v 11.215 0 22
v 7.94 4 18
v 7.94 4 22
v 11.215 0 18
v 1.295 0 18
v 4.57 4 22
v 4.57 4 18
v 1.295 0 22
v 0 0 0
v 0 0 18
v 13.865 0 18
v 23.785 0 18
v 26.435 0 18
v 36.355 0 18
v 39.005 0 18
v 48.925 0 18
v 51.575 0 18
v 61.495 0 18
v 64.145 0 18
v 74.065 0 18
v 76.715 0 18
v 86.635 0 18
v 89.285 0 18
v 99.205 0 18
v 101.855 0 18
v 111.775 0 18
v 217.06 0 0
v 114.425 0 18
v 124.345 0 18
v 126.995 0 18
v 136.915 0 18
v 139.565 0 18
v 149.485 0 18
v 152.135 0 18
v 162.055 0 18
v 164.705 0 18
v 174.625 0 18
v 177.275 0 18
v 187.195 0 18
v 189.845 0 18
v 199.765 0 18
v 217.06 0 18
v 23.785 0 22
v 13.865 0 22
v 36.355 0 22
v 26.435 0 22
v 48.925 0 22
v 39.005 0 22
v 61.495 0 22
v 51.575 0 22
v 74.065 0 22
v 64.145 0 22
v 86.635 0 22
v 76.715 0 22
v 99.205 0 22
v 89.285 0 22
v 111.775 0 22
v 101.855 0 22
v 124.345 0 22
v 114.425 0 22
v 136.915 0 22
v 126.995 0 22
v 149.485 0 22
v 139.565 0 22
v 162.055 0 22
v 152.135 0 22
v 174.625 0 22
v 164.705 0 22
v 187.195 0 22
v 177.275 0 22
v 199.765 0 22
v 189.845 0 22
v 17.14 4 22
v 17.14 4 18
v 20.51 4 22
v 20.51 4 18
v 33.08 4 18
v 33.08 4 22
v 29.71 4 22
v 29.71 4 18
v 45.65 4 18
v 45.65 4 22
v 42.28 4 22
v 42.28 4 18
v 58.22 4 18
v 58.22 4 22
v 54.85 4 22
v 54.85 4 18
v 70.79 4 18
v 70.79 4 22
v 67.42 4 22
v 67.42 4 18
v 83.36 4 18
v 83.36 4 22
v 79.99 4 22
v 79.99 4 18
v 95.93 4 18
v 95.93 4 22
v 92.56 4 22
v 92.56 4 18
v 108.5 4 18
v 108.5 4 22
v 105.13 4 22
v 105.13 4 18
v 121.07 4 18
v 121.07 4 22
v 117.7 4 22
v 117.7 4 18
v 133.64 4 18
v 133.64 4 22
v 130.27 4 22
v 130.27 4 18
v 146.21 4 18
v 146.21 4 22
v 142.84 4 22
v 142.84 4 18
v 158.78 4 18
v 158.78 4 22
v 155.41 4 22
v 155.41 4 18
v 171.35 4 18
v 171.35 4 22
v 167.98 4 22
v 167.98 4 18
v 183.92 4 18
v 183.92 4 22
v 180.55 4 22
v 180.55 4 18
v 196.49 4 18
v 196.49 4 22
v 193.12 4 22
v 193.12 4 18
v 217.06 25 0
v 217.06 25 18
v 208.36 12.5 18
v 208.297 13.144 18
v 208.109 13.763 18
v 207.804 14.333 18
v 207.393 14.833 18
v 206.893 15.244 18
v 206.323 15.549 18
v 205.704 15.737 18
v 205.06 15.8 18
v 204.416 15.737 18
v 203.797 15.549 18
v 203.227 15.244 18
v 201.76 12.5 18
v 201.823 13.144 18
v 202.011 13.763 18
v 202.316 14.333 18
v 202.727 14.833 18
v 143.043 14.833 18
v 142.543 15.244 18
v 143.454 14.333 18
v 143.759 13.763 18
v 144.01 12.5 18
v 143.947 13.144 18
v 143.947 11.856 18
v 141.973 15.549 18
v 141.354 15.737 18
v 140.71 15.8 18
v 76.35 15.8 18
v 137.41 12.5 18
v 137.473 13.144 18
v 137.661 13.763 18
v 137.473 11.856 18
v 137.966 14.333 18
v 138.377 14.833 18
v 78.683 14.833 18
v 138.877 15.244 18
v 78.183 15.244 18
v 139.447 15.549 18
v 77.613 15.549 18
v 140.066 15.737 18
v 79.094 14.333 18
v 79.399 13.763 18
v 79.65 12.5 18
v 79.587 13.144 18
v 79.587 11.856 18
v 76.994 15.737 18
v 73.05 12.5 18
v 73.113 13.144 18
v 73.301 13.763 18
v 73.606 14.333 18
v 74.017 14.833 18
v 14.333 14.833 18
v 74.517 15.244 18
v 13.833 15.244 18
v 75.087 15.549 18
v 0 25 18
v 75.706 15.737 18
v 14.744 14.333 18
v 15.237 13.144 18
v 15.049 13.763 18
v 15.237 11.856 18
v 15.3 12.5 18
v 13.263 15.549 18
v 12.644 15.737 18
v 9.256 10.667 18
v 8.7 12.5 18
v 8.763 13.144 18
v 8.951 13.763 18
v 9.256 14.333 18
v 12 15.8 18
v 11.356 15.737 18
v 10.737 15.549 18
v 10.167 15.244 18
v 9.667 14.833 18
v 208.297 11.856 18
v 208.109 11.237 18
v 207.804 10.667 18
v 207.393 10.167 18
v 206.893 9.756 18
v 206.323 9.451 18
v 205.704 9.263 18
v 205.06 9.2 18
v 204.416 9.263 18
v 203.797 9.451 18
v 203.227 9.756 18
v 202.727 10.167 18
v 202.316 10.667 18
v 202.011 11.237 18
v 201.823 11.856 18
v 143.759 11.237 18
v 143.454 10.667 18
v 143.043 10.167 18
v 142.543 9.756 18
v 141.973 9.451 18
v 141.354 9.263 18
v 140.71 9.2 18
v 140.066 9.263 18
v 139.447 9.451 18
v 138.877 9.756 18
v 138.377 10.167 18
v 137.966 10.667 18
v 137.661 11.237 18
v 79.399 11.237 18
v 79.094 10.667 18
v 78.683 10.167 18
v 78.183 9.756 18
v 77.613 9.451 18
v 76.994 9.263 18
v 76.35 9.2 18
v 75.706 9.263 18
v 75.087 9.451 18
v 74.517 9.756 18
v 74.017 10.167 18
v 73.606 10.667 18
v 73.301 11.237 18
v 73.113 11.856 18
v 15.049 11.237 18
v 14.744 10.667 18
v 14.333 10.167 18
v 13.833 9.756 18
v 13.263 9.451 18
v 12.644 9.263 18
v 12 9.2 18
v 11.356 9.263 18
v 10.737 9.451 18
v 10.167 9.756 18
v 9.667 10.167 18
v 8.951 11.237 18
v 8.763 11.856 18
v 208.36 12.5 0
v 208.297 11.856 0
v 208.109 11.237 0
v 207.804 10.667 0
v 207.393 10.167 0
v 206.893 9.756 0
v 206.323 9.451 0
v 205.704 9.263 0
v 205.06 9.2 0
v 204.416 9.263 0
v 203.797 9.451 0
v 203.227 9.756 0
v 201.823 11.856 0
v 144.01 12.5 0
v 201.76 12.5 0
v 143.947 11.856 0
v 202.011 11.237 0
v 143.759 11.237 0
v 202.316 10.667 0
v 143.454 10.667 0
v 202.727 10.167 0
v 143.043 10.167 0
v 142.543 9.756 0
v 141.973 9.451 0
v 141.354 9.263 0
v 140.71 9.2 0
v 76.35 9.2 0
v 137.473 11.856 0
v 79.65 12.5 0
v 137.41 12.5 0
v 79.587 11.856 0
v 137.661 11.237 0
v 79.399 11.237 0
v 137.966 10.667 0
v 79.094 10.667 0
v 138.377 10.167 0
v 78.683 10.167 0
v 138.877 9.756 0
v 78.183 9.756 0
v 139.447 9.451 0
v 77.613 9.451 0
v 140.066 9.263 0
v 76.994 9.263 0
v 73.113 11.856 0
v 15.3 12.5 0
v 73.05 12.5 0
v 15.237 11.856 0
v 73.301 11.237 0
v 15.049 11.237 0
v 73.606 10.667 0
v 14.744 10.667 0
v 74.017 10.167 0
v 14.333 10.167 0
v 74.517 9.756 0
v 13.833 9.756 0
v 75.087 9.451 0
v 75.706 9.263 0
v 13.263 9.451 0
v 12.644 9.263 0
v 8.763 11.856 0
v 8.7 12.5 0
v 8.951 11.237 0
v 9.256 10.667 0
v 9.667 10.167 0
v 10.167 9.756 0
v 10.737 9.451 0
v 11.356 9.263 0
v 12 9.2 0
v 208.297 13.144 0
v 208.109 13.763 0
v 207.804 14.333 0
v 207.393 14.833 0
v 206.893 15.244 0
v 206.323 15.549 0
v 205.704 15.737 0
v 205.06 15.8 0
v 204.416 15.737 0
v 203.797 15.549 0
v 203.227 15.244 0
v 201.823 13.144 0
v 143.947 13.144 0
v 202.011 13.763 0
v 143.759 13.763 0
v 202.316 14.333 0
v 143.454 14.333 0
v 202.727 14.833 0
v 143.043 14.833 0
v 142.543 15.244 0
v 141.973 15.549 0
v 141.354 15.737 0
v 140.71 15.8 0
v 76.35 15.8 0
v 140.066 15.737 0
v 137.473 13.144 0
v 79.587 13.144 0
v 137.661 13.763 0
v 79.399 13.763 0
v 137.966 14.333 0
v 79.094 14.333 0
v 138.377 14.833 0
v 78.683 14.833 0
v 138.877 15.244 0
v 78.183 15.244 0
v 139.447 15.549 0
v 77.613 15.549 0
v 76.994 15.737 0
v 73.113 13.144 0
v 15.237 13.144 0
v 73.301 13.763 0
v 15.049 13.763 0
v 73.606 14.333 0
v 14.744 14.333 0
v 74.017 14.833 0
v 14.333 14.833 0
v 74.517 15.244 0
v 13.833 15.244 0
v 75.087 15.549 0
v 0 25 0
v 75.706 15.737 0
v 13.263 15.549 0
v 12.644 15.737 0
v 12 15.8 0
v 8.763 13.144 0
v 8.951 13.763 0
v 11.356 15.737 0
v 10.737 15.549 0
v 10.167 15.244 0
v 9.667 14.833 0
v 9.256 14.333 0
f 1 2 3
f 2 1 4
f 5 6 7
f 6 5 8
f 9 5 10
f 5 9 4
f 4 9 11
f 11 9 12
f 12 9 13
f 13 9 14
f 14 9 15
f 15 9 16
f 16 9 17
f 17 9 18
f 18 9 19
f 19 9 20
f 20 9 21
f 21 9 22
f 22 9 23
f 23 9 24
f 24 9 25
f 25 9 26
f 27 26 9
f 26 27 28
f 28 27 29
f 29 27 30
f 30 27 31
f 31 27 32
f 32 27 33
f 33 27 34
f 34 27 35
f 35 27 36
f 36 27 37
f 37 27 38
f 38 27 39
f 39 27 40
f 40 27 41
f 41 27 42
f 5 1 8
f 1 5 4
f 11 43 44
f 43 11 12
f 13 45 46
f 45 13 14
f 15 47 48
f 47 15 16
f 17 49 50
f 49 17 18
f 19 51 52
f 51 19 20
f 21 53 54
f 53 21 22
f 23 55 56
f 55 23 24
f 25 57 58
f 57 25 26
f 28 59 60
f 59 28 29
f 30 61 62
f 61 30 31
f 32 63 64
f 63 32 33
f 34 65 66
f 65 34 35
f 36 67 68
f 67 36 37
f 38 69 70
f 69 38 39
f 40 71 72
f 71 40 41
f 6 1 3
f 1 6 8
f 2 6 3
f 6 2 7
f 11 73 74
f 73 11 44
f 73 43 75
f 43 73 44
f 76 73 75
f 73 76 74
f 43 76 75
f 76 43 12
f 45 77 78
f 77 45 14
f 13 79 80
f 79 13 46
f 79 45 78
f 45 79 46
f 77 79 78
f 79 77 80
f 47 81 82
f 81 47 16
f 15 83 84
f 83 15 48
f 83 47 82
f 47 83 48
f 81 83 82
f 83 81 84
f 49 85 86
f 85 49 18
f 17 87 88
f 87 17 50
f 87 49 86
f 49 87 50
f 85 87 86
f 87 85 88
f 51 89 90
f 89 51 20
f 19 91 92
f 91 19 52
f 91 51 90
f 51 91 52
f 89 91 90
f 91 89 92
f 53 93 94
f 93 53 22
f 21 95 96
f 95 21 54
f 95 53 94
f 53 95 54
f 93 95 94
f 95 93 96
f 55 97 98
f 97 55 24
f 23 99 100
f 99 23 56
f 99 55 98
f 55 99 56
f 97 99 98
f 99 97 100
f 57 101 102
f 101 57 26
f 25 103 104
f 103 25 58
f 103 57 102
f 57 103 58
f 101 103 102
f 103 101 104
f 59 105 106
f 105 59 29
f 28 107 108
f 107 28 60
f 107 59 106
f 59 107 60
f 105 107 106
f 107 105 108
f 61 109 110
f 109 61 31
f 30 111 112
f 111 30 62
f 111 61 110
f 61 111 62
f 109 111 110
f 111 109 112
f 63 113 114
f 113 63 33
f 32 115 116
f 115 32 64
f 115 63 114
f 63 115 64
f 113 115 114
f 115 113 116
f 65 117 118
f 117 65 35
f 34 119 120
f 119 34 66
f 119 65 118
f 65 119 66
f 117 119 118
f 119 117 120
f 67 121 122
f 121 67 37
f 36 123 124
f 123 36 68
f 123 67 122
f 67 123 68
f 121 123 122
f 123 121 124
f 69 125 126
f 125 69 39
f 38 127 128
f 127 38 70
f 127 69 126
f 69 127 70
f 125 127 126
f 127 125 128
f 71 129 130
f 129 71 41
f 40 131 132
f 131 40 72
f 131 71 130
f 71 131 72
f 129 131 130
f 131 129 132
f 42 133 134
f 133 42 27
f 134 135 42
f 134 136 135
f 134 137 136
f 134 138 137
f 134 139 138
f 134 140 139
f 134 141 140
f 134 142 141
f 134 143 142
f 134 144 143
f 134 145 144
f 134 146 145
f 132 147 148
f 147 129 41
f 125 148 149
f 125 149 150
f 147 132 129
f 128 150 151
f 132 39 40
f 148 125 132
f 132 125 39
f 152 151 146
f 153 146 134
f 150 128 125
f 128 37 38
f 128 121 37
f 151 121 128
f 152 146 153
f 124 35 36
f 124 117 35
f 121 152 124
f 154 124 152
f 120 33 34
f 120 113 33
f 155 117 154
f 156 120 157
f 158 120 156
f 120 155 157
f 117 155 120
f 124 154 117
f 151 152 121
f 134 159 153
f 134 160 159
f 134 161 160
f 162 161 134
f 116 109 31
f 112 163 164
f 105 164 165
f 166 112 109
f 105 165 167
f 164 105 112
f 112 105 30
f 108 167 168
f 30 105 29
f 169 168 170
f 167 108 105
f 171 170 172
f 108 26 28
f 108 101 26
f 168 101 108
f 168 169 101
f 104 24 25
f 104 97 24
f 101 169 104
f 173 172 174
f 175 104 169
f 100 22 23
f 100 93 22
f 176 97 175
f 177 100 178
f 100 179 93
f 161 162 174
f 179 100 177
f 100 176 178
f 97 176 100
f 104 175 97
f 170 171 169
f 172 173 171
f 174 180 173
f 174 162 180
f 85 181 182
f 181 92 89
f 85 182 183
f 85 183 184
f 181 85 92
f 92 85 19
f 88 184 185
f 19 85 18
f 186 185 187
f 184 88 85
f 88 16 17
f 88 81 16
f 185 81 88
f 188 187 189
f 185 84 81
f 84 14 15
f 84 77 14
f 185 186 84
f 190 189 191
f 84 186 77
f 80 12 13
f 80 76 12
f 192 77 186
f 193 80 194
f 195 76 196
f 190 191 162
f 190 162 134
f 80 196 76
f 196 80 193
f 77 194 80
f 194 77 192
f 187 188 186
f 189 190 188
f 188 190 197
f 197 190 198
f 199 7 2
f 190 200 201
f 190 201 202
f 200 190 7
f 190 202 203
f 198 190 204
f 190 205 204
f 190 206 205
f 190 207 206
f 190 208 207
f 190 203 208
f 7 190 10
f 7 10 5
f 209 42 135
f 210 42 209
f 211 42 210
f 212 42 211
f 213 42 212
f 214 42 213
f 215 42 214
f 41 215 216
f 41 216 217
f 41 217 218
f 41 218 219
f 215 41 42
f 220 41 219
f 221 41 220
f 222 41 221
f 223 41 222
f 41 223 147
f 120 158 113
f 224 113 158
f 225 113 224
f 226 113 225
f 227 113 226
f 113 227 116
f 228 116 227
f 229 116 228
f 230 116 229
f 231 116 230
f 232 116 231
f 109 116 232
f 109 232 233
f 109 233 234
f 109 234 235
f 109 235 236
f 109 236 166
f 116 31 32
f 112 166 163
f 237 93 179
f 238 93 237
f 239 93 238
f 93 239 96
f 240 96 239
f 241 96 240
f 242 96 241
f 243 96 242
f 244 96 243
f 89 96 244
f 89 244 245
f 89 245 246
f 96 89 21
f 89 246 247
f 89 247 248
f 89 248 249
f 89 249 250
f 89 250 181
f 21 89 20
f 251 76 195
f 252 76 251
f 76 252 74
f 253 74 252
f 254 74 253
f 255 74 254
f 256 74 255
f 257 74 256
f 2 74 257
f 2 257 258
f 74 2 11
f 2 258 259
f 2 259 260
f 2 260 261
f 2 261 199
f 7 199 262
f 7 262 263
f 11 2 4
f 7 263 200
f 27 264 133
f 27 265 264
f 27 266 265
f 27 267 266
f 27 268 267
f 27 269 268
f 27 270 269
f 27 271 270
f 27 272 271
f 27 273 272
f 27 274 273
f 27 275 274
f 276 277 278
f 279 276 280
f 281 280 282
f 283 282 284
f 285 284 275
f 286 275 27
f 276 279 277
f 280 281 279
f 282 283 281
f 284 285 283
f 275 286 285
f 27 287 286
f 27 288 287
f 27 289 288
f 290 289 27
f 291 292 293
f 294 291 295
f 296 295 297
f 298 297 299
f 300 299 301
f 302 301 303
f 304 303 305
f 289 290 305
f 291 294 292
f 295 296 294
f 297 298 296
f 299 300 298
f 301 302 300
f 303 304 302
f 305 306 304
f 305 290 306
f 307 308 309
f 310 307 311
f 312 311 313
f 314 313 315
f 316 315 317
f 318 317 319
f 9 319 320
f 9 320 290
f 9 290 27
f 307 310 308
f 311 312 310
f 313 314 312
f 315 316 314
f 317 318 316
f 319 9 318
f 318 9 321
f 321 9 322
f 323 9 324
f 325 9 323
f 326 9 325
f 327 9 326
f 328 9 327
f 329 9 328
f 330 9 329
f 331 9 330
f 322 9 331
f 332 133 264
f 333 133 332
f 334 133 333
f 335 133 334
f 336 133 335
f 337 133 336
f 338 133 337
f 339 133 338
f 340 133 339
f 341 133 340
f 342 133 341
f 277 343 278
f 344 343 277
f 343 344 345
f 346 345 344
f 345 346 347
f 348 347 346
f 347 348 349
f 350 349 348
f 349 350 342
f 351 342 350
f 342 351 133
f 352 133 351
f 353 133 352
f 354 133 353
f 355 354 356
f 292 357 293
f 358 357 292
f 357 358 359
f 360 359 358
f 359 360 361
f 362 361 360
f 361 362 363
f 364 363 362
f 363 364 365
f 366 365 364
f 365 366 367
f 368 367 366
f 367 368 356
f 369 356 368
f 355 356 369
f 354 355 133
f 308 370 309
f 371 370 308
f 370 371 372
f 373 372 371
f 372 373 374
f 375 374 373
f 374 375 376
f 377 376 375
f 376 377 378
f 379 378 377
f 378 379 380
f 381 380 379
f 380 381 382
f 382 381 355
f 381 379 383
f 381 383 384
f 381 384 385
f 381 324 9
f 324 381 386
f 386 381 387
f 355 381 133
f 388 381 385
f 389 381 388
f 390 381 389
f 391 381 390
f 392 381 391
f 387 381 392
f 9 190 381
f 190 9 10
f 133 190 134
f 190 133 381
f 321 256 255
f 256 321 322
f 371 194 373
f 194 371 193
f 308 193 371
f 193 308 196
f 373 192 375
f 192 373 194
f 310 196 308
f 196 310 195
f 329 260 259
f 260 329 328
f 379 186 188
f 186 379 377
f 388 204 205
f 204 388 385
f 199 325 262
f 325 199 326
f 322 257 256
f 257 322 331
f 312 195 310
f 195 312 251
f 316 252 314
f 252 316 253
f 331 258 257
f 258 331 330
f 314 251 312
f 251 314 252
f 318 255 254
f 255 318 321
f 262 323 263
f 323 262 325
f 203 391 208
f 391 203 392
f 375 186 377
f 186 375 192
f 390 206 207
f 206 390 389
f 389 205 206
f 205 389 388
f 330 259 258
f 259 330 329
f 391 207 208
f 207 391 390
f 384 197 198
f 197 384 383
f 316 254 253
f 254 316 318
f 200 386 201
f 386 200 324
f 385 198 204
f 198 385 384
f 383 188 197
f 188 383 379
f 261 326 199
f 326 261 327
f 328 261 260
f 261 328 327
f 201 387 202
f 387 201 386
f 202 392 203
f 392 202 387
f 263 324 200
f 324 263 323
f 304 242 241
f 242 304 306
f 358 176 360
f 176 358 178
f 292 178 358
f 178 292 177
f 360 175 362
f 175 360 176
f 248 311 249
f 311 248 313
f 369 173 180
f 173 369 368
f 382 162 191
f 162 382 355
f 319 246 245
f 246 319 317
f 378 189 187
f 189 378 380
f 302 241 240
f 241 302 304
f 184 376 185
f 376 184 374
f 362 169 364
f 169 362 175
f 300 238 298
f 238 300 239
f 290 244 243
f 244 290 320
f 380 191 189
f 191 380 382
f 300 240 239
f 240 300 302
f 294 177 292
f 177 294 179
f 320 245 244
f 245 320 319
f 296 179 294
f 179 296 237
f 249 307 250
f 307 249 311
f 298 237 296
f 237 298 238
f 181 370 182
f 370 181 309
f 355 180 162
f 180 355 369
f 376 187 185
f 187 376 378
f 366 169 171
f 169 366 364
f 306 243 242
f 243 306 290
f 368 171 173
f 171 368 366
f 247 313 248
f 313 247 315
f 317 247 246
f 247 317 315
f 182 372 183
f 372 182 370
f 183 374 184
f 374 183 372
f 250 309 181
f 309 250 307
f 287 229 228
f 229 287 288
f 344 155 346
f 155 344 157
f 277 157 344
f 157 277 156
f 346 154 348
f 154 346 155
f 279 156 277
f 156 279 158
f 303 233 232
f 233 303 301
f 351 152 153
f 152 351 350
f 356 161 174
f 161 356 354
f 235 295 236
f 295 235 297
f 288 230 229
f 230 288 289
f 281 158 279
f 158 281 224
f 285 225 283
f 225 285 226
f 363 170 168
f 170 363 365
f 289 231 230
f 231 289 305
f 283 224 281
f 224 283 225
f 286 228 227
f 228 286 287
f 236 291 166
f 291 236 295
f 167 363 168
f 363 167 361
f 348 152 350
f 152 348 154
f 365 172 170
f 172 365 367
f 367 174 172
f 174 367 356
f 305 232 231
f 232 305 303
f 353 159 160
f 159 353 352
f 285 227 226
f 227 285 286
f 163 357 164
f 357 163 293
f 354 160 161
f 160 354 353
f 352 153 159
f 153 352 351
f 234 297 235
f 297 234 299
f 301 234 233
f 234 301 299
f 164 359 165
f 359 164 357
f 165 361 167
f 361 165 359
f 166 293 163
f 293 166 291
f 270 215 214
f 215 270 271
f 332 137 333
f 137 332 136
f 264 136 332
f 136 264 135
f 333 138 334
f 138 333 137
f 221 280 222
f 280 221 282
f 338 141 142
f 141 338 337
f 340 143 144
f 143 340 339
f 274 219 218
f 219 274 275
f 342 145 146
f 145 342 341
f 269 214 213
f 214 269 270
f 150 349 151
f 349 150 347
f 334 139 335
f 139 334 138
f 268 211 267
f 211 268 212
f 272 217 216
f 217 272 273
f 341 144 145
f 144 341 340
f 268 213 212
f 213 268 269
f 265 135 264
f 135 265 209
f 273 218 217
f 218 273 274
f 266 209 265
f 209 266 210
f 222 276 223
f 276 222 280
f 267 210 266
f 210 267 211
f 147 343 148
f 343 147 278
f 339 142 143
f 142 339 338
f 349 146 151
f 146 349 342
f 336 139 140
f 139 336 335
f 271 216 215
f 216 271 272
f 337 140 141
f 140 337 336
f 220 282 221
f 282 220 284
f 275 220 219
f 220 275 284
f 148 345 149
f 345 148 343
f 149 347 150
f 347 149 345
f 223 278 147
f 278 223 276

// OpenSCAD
$fn = 32;

// ----------------------------------------------------------------------
// Gear rack: m=4 z=16, 217.06 x 25 x 22 mm
// ----------------------------------------------------------------------

// --- parameters (mm) ---
length = 217.06;          // rack length, X
width = 25;               // rack width, Y
height = 22;              // overall height, Z
module_m = 4;             // module
back_t = 18;              // tooth root line height
pitch = 12.57;            // circular pitch
tip_w = 3.37;             // tooth thickness at the tip
root_w = 9.92;            // tooth thickness at the root line
hole_d = 6.6;             // mounting hole
sink = 0.6;               // tooth root overlap into the body

tooth_span = 201.06;

module tooth(x0) {
  /* 20 deg flank profile, sunk into the body for a positive overlap */
  translate([x0, 0, back_t - sink])
    linear_extrude(height = height - back_t + sink)
      polygon(points = [[-root_w / 2, 0], [root_w / 2, 0],
                        [tip_w / 2, height - back_t],
                        [-tip_w / 2, height - back_t]]);
}

difference() {
  union() {
    cube([length, width, back_t]);
    for (i = [0 : 16 - 1])
      tooth((i + 0.5) * pitch + (tooth_span - 16 * pitch) / 2);
  }
  translate([12, 12.5, -1]) cylinder(h = back_t + 2, d = hole_d);
  translate([76.35, 12.5, -1]) cylinder(h = back_t + 2, d = hole_d);
  translate([140.71, 12.5, -1]) cylinder(h = back_t + 2, d = hole_d);
  translate([205.06, 12.5, -1]) cylinder(h = back_t + 2, d = hole_d);
}
